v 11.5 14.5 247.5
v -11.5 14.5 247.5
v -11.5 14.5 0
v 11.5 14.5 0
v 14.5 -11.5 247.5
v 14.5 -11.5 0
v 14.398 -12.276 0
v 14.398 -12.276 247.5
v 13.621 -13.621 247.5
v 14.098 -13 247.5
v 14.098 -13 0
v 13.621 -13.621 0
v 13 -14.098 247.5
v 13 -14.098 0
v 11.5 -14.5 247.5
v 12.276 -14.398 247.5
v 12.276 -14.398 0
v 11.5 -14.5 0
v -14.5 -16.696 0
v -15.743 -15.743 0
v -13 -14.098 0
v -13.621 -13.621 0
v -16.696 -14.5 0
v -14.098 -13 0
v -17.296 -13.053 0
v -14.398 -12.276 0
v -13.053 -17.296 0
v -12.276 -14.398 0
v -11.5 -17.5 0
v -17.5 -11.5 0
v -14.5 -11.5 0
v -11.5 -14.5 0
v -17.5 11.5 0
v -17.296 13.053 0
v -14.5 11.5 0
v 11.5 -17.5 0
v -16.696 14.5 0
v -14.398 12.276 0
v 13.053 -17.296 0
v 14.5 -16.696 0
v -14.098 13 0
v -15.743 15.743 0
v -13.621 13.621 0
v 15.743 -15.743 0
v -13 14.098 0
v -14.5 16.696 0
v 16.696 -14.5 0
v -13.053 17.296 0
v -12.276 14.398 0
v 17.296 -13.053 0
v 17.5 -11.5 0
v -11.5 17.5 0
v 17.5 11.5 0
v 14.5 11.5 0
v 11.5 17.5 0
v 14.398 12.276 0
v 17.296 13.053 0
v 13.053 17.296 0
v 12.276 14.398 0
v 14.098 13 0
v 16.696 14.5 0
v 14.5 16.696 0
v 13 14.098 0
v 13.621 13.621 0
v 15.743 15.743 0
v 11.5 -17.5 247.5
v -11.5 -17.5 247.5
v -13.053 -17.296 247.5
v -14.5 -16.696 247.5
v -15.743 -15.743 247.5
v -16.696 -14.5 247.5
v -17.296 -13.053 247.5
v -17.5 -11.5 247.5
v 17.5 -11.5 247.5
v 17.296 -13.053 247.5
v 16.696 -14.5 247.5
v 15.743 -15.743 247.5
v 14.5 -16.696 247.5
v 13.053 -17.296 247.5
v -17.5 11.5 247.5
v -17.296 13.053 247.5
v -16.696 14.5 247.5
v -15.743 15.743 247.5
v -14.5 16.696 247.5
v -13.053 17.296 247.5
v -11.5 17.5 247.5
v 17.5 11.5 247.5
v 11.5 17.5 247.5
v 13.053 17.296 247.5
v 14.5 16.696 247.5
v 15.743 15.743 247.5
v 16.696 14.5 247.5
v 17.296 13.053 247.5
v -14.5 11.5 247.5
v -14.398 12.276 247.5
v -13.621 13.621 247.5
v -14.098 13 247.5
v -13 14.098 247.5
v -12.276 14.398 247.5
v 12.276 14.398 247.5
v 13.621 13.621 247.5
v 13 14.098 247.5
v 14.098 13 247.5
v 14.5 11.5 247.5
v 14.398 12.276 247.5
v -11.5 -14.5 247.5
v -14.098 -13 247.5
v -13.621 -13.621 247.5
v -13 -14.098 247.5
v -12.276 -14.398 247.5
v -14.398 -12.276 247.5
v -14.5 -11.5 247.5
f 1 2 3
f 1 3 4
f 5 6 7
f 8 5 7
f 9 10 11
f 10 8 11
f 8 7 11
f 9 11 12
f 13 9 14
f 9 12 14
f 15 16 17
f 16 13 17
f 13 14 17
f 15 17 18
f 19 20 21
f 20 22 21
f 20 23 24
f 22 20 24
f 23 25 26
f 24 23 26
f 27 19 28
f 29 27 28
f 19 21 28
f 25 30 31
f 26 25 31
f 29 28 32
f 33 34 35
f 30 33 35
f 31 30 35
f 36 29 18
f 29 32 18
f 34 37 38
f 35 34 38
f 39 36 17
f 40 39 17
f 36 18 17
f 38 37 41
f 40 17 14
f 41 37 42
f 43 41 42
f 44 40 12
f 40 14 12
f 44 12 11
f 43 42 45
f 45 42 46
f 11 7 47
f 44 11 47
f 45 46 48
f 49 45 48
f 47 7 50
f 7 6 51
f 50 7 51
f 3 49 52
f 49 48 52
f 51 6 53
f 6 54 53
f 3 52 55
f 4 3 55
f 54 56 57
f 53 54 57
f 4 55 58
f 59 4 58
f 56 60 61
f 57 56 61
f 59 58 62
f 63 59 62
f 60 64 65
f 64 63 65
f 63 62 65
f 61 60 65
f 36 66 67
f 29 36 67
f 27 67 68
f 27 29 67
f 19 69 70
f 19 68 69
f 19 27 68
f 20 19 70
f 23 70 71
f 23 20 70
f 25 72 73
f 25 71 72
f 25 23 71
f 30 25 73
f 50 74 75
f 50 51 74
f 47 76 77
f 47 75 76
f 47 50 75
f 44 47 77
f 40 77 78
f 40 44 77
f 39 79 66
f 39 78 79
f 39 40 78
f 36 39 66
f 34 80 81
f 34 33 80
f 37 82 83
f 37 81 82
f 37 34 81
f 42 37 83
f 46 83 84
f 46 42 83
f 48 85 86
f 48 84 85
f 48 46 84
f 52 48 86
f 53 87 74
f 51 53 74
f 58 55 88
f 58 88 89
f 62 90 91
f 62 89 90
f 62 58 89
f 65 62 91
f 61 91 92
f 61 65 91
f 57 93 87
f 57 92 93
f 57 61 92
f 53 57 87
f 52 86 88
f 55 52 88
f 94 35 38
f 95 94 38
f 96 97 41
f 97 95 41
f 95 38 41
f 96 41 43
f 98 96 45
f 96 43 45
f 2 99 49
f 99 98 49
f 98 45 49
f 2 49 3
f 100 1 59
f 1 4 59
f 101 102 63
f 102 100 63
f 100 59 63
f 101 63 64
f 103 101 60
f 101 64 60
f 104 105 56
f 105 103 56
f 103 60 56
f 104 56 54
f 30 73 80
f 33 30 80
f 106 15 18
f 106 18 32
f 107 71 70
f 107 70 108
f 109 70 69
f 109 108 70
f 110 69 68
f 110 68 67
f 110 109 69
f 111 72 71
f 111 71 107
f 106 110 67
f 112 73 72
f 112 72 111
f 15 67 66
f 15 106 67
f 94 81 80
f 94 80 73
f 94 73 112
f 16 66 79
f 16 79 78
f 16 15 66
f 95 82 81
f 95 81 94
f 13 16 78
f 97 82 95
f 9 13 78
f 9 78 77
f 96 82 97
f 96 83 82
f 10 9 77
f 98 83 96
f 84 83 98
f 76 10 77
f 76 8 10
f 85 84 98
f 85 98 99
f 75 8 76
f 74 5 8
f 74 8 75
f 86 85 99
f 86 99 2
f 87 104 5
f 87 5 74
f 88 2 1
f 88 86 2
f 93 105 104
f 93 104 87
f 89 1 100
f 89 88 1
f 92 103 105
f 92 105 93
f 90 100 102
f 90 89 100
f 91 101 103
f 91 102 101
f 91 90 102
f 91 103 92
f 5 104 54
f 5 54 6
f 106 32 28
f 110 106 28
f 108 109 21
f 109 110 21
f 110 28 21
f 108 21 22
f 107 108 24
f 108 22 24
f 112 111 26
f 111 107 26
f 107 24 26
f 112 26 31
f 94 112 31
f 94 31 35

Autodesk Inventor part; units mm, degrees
ref_plane "YZ Plane" through (0, 0, 0) normal (1, 0, 0) x (0, 1, 0)
ref_plane "Počáteční rovina" through (0, 0, 0) normal (0, 0, 1) x (1, 0, 0)
ref_plane "Koncová rovina" through (0, 0, 250) normal (0, 0, 1) x (1, 0, 0)
sketch "Náčrt1" plane through (0, 0, 0) normal (0, 0, 1) x (1, 0, 0)
  line L0 (-11.5, 17.5) -> (11.5, 17.5)
  line L1 (17.5, 11.5) -> (17.5, -11.5)
  line L2 (11.5, -17.5) -> (-11.5, -17.5)
  line L3 (-17.5, -11.5) -> (-17.5, 11.5)
  arc A0 (-11.5, 17.5) -> (-17.5, 11.5) centre (-11.5, 11.5) ccw
  arc A1 (17.5, 11.5) -> (11.5, 17.5) centre (11.5, 11.5) ccw
  arc A2 (11.5, -17.5) -> (17.5, -11.5) centre (11.5, -11.5) ccw
  arc A3 (-17.5, -11.5) -> (-11.5, -17.5) centre (-11.5, -11.5) ccw
  line L4 (-26.2397, 0) -> (26.2397, 0) construction
  line L5 (0, -26.2397) -> (0, 26.2397) construction
  arc A4 (-11.5, 14.5) -> (-14.5, 11.5) centre (-11.5, 11.5) ccw
  line L6 (-11.5, 14.5) -> (11.5, 14.5)
  arc A5 (14.5, 11.5) -> (11.5, 14.5) centre (11.5, 11.5) ccw
  line L7 (14.5, 11.5) -> (14.5, -11.5)
  arc A6 (11.5, -14.5) -> (14.5, -11.5) centre (11.5, -11.5) ccw
  line L8 (11.5, -14.5) -> (-11.5, -14.5)
  arc A7 (-14.5, -11.5) -> (-11.5, -14.5) centre (-11.5, -11.5) ccw
  line L9 (-14.5, -11.5) -> (-14.5, 11.5)
  point P0 (-17.5, 17.5)
  point P1 (17.5, -17.5)
  point P2 (17.5, 17.5)
  dimension "b" = 35
  dimension "msp_r" = 6
  dimension "d8" = 17.5
  dimension "d9" = 17.5
  dimension "d10" = 3
extrude "Těleso" add sketch "Náčrt1" along normal blind 247.5
sketch "Sketch2" plane through (0, 0, 0) normal (0, 0, 1) x (1, 0, 0)
  line L0 (0, 0) -> (10, 0)
ref_plane "Work Plane3" through (0, 0, 0) normal (0, -1, 0) x (1, 0, 0)
sketch "Sketch3" plane through (0, 0, 0) normal (0, -1, 0) x (1, 0, 0)
  line L0 (-2, 0) -> (12, 0)
  line L1 (-2, 250) -> (12, 250)
  dimension "d14" = 250
equation "\"msp_r\" = 2 * ParT"
equation "\"d8\" = d9"
equation "\"d9\" = 0.5 * b"
equation "\"d10\" = ParT"
equation "\"G_OFFSET_START\" = 0"
equation "\"G_OFFSET_END\" = 0"
equation "\"G_L\" = d14"
equation "\"ParT\" = 3"
properties part number "CSN 426935 - 35x35x3-250" material "Nerezová ocel"
